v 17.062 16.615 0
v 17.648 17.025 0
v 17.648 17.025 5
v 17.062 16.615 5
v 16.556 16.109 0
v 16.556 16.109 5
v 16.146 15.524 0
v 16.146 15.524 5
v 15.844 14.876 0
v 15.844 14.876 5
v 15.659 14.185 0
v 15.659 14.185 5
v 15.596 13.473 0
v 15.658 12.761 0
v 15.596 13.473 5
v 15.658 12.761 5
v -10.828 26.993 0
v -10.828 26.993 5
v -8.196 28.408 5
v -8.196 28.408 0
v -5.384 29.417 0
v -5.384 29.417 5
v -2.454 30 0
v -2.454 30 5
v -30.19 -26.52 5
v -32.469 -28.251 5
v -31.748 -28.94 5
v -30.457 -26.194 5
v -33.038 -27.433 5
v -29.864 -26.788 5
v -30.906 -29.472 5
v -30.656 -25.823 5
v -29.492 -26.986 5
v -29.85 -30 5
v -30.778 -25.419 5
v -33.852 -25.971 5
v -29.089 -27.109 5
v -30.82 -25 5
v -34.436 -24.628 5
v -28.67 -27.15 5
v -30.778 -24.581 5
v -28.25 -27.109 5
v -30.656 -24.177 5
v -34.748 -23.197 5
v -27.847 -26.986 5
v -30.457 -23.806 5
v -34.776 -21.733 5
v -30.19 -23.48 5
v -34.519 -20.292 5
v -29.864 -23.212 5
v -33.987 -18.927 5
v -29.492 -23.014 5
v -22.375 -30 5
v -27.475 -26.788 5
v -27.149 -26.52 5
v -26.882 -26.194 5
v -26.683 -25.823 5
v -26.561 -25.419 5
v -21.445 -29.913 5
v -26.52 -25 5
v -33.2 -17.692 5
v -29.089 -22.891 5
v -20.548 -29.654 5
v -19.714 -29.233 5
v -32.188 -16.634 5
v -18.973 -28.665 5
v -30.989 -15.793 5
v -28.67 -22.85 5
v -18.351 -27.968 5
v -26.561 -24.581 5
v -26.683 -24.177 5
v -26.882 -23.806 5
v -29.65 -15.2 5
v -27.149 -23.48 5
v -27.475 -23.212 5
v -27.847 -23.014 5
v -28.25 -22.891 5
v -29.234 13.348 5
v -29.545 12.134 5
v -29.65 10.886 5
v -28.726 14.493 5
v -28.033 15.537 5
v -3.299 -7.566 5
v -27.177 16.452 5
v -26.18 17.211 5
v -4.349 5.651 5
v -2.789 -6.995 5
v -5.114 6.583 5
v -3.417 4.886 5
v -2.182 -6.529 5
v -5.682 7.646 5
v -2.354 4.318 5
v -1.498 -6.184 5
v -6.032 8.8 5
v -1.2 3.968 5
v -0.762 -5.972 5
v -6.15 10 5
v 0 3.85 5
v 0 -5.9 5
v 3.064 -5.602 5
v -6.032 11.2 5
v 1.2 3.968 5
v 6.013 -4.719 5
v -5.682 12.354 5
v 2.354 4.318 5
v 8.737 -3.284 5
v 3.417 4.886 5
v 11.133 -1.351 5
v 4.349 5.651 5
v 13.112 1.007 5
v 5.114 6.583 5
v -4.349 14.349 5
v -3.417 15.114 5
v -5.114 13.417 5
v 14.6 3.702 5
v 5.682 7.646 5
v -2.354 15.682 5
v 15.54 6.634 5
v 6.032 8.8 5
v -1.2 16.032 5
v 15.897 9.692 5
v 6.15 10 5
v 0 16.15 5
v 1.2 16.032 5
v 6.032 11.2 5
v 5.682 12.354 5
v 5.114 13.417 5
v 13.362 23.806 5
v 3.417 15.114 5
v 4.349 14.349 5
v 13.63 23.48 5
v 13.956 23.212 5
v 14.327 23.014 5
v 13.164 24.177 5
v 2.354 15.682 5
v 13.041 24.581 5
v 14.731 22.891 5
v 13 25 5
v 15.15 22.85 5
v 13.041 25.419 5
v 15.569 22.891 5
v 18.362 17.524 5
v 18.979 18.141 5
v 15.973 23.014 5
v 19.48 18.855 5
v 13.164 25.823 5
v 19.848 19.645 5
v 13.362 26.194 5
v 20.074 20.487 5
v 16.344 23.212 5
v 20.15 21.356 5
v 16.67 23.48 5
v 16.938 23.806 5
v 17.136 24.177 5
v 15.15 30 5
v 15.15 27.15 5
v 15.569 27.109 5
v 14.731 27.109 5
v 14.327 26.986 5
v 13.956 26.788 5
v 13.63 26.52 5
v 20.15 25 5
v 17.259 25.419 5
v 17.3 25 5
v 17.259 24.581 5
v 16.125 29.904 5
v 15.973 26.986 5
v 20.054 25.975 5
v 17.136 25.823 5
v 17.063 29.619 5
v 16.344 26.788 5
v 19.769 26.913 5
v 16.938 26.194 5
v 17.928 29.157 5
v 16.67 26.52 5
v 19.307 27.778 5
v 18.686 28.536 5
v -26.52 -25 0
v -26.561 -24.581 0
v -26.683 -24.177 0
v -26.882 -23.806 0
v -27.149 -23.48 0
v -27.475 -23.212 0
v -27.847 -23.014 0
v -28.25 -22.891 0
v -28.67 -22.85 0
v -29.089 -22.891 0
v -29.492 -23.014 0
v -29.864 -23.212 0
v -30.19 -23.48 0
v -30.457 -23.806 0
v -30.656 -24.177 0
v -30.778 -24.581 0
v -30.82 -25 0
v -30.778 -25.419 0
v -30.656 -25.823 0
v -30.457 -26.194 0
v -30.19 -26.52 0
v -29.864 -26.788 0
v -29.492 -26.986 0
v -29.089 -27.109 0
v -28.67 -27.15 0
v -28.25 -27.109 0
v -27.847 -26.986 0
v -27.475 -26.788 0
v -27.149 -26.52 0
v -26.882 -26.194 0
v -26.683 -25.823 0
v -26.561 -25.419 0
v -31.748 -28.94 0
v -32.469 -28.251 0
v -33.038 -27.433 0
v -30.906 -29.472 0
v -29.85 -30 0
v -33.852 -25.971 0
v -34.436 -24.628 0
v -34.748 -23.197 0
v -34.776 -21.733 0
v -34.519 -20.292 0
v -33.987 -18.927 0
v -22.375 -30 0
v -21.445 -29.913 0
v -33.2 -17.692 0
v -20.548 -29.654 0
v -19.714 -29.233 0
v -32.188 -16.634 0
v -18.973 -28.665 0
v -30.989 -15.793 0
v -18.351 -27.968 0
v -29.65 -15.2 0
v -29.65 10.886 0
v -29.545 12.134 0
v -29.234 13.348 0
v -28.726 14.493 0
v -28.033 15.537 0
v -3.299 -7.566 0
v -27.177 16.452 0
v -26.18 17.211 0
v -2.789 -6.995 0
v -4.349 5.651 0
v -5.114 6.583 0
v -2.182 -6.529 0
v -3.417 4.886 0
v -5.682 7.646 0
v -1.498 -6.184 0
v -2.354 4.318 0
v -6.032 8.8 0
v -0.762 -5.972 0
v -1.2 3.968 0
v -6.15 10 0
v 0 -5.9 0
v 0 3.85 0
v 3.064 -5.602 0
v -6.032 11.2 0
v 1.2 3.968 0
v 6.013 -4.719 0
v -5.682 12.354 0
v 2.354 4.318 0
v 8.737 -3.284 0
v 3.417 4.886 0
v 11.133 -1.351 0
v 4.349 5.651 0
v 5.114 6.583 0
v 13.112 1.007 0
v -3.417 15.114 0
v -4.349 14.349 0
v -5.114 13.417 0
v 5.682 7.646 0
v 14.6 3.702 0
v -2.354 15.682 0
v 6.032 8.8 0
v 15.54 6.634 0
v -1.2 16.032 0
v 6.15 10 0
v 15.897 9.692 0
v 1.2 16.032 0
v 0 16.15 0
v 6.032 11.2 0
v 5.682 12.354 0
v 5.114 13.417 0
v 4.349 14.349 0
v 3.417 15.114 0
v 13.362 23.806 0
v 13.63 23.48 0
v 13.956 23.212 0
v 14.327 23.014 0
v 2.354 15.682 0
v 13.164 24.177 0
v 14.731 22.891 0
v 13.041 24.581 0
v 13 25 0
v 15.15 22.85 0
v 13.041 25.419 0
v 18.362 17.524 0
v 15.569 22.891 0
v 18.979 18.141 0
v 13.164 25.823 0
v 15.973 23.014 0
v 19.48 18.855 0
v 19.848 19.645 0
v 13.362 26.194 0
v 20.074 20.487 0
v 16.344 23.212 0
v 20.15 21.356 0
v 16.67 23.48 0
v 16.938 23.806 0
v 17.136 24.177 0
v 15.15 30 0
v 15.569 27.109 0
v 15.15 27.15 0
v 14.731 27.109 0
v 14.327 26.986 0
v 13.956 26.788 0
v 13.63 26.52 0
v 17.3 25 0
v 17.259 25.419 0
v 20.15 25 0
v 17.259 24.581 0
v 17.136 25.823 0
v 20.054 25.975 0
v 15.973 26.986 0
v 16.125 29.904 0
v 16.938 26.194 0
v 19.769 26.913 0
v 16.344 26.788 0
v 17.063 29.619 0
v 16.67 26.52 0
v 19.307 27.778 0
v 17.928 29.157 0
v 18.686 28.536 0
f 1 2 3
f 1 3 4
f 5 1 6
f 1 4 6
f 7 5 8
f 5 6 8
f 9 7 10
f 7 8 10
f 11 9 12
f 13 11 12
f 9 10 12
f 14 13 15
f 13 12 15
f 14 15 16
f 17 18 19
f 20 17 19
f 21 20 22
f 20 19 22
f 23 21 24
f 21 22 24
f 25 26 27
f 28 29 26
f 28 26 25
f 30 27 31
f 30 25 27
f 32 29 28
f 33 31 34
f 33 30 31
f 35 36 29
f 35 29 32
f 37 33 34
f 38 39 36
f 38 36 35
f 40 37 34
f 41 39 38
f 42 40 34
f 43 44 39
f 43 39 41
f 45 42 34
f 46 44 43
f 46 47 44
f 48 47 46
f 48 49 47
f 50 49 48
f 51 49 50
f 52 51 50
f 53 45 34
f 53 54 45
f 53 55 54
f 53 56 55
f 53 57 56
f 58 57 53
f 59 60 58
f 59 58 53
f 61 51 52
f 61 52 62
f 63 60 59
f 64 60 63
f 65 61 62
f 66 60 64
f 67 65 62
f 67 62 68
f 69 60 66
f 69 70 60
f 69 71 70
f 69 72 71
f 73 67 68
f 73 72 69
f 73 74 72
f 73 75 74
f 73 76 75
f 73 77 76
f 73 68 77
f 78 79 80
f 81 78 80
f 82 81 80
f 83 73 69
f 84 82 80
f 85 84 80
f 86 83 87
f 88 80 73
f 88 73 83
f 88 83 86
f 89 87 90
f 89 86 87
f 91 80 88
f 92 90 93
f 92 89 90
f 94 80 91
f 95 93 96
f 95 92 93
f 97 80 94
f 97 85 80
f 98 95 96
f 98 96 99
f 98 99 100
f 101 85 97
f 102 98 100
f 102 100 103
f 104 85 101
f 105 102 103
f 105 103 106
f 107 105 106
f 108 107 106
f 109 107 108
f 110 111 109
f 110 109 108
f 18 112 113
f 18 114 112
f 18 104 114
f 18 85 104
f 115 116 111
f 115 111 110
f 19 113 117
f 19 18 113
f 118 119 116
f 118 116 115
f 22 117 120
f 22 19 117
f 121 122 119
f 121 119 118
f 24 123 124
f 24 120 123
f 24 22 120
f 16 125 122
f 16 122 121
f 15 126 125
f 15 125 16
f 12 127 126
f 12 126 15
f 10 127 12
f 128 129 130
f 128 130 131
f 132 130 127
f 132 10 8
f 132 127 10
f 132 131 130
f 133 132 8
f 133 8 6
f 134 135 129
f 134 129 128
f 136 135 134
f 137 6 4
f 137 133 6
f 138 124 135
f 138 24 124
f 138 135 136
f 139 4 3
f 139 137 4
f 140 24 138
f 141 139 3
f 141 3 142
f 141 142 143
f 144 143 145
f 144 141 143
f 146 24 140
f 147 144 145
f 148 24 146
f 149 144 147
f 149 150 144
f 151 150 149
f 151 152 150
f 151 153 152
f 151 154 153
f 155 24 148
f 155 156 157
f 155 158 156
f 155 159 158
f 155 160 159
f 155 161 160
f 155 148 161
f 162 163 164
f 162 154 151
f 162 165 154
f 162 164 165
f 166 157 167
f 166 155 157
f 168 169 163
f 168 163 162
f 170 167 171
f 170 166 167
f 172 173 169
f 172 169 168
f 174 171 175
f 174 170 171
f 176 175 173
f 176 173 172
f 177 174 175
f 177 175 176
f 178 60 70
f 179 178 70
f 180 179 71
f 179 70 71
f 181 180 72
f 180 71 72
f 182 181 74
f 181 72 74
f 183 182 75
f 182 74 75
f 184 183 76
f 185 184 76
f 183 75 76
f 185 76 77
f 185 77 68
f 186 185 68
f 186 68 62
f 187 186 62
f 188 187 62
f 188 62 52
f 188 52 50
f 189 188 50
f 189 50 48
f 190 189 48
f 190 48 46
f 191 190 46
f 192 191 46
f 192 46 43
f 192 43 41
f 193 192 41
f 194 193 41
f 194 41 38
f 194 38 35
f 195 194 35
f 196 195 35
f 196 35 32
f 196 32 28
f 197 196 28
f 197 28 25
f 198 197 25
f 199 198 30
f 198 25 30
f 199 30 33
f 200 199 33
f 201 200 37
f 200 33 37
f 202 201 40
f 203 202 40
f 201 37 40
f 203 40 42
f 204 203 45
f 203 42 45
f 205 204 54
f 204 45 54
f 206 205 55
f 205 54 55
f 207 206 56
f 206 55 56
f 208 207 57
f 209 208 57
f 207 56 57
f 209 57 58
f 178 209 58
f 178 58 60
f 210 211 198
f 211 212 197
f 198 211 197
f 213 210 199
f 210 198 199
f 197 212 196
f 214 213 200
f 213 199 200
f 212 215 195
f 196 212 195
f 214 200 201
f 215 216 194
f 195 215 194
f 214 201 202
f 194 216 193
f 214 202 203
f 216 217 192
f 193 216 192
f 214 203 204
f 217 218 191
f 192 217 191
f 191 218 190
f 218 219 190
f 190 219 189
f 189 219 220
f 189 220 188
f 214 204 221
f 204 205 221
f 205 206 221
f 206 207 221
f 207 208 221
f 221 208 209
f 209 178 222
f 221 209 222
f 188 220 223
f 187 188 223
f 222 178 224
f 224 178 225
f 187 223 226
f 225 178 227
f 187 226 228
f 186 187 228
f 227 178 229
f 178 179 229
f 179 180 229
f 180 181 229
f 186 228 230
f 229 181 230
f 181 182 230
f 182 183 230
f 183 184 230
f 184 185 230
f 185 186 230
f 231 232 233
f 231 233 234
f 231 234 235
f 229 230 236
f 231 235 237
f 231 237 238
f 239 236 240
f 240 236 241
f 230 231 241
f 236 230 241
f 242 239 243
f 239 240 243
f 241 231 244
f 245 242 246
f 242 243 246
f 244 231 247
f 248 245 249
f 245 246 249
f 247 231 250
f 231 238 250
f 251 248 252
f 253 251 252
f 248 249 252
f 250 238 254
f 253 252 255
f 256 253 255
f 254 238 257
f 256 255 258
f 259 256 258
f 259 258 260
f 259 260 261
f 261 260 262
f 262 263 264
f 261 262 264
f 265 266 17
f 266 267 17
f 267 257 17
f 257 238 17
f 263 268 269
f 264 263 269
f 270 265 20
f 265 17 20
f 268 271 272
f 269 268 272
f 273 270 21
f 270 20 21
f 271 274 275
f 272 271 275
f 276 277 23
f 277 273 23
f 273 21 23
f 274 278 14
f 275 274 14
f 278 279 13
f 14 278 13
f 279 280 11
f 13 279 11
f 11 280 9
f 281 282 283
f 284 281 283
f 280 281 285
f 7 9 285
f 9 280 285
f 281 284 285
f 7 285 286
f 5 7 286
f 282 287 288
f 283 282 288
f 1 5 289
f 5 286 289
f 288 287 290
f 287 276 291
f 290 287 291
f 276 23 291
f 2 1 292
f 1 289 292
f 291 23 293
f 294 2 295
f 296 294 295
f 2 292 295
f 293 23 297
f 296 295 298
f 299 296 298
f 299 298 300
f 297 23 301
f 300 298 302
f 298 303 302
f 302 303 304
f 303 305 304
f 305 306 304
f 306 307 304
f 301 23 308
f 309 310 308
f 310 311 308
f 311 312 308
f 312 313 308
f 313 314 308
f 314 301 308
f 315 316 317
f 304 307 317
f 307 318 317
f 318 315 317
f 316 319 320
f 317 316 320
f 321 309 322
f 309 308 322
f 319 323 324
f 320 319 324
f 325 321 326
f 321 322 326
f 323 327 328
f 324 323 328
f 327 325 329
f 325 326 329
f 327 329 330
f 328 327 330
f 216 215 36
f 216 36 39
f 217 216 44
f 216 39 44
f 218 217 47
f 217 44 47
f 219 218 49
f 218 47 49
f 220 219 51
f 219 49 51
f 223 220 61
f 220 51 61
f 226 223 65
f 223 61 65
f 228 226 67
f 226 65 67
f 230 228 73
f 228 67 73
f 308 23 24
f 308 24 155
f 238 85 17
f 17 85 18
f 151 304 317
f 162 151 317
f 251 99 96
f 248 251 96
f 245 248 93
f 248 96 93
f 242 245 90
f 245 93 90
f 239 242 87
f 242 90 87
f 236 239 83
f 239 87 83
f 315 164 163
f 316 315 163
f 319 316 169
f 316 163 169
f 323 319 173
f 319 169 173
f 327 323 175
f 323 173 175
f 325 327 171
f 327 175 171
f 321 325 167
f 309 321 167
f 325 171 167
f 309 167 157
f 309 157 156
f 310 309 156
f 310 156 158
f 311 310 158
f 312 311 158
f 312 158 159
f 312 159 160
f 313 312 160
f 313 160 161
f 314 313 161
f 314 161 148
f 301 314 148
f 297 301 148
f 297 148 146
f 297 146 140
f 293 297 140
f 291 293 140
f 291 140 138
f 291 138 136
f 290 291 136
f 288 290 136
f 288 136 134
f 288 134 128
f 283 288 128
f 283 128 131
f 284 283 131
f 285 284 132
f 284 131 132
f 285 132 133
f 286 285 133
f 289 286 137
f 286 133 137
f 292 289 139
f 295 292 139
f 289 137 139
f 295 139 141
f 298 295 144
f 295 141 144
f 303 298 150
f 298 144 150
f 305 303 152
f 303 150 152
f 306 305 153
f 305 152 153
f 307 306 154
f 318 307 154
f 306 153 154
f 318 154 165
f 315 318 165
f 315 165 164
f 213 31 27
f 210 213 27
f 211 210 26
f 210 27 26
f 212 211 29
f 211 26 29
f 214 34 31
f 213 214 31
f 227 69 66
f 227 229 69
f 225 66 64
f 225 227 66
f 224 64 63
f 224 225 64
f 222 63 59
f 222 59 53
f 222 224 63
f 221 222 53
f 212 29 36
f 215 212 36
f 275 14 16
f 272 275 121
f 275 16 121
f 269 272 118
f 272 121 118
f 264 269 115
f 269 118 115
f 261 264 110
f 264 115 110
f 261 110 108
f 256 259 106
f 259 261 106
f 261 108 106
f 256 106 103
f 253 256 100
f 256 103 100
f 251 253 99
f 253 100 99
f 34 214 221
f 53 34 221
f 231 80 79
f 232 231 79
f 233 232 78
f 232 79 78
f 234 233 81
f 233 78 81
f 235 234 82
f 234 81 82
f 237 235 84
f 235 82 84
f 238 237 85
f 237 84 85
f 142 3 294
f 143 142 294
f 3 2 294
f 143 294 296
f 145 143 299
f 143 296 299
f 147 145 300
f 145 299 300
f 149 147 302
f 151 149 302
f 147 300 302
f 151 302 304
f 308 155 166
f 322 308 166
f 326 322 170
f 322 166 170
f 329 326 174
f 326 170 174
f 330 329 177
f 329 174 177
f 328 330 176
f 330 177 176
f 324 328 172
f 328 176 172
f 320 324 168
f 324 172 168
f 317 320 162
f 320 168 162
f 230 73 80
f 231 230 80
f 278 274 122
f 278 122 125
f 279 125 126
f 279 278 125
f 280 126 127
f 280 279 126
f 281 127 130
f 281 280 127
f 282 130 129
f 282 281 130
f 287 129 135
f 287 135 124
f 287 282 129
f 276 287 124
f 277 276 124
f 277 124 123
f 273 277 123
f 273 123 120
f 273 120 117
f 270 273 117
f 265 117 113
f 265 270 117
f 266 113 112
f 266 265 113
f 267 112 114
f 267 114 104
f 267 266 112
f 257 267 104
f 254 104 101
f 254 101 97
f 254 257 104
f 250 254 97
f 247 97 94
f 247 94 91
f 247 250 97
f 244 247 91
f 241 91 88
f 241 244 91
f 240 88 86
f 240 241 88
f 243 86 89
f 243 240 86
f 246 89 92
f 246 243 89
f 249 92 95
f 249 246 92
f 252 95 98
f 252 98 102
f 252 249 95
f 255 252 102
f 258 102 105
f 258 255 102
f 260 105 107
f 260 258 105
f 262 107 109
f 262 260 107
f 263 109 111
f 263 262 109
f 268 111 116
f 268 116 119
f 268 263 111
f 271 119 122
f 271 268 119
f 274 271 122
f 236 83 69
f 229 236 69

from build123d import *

# Parameters (mm, degrees)
SKETCH_1_W          = 80
SKETCH_1_H          = 60
SKETCH_1_R          = 6.15
EXTRUDE_1_DEPTH     = 5
SKETCH_2_R          = 2.15
CUT_EXTRUDE_1_DEPTH = 68.134361545
SKETCH_3_R          = 2.15
CUT_EXTRUDE_2_DEPTH = 68.134361545
CUT_EXTRUDE_3_DEPTH = 68.134361545
SKETCH_6_R          = 2.15
CUT_EXTRUDE_5_DEPTH = 68.134361545
CUT_EXTRUDE_7_DEPTH = 68.134361545
FILLET_1_R          = 7.5
CUT_EXTRUDE_8_DEPTH = 47.216858546
FILLET_2_R          = 5
FILLET_3_R          = 5


with BuildPart() as part:
    # ｽｹｯﾁ1 → ﾎﾞｽ - 押し出し1 (new body)
    with BuildSketch(Plane.XY):
        with Locations((-19.85, 0)):
            Rectangle(SKETCH_1_W, SKETCH_1_H)
        with Locations((0, 10)):
            Circle(SKETCH_1_R, mode=Mode.SUBTRACT)
    extrude(amount=EXTRUDE_1_DEPTH)

    # ｽｹｯﾁ2 → ｶｯﾄ - 押し出し1 (cut, through all)
    with BuildSketch(Plane.XY.offset(5)):
        with Locations((-54.85, 10)):
            Circle(SKETCH_2_R)
        with Locations(Location((-54.85, -10, 0), (0, 0, 180))):
            Circle(SKETCH_2_R)
        with Locations((-34.85, 10)):
            Circle(SKETCH_2_R)
        with Locations(Location((-34.85, -10, 0), (0, 0, 180))):
            Circle(SKETCH_2_R)
    extrude(amount=-CUT_EXTRUDE_1_DEPTH, mode=Mode.SUBTRACT)

    # ｽｹｯﾁ3 → ｶｯﾄ - 押し出し2 (cut, through all)
    with BuildSketch(Plane.XY.offset(5)):
        with Locations((15.15, 25)):
            Circle(SKETCH_3_R)
        with BuildLine():
            ThreePointArc((15.15, 30), (18.685533906, 28.535533906), (20.15, 25))
            Line((20.15, 25), (20.15, 30))
            Line((20.15, 30), (15.15, 30))
        make_face()
    extrude(amount=-CUT_EXTRUDE_2_DEPTH, mode=Mode.SUBTRACT)

    # ｽｹｯﾁ4 → ｶｯﾄ - 押し出し3 (cut, through all)
    with BuildSketch(Plane.XY.offset(5)):
        Polygon((-59.85, 30), (-59.85, 15), (-29.85, 30), align=None)
        Polygon((-29.85, -30), (-59.85, -15), (-59.85, -30), align=None)
        with BuildLine():
            Line((20.15, 0), (17.493498792, 0))
            ThreePointArc((17.493498792, 0), (15.094907291, -3.347893986), (12.06572435, -6.138178209))
            Line((12.06572435, -6.138178209), (-19.85, -30))
            Line((-19.85, -30), (20.15, -30))
            Line((20.15, -30), (20.15, 0))
        make_face()
        with BuildLine():
            ThreePointArc((20.15, 10), (19.474553919, 4.8265824), (17.493498792, 0))
            Line((17.493498792, 0), (20.15, 0))
            Line((20.15, 0), (20.15, 10))
        make_face()
    extrude(amount=-CUT_EXTRUDE_3_DEPTH, mode=Mode.SUBTRACT)

    # ｽｹｯﾁ6 → ｶｯﾄ - 押し出し5 (cut, through all)
    with BuildSketch(Plane.XY.offset(5)):
        with Locations((-28.669660113, -25)):
            Circle(SKETCH_6_R)
    extrude(amount=-CUT_EXTRUDE_5_DEPTH, mode=Mode.SUBTRACT)

    # ｽｹｯﾁ7 → ｶｯﾄ - 押し出し7 (cut, through all)
    with BuildSketch(Plane.XY.offset(5)):
        with BuildLine():
            Line((-33.038002917, -27.432607888), (-39.85, -15.2))
            Line((-39.85, -15.2), (-29.65, -15.2))
            Line((-29.65, -15.2), (-29.65, 15))
            Line((-29.65, 15), (-10.828193198, 26.993314334))
            ThreePointArc((-10.828193198, 26.993314334), (-6.809164655, 28.964645441), (-2.454078238, 30))
            Line((-2.454078238, 30), (-29.85, 30))
            Line((-29.85, 30), (-59.85, 15))
            Line((-59.85, 15), (-59.85, -15))
            Line((-59.85, -15), (-30.90572732, -29.47213634))
            ThreePointArc((-30.90572732, -29.47213634), (-32.125738379, -28.613242729), (-33.038002917, -27.432607888))
        make_face()
    extrude(amount=-CUT_EXTRUDE_7_DEPTH, mode=Mode.SUBTRACT)

    # ﾌｨﾚｯﾄ1
    # the kernel refuses this fillet: 7.5 mm, written as the material it takes off along each edge
    with BuildSketch(Plane(origin=(-39.85, -15.2, 35.821289963), x_dir=(1, 0, 0), z_dir=(0, 0, -1))) as fillet_1_piece_1:
        with BuildLine():
            CenterArc((12.550603255, 7.122124988), FILLET_1_R, 150.887789783, 100.847129313)
            Line((5.998089047, 10.77103682), (5.867038763, 10.844015057))
            Line((5.867038763, 10.844015057), (-0.131050284, 0.072978237))
            Line((-0.131050284, 0.072978237), (0, -0.15))
            ThreePointArc((0, -0.15), (5.1, -0.15), (10.152987935, -0.1424425))
            Line((10.152987935, -0.1424425), (10.2, 0))
        make_face()
    extrude(amount=66.642579926, mode=Mode.SUBTRACT)
    with BuildSketch(Plane(origin=(-29.65, 15, 15.285449565), x_dir=(0.8433406617465673, 0.5373793150511676, 0), z_dir=(0, 0, -1))) as fillet_1_piece_2:
        with BuildLine():
            CenterArc((FILLET_1_R * 0.548557310151, FILLET_1_R), FILLET_1_R, 212.505415036, 57.494584964)
            Line((-FILLET_1_R * 0.294783351595, FILLET_1_R * 0.462620684949), (-FILLET_1_R * 0.31165016483, FILLET_1_R * 0.451873098648))
            Line((-FILLET_1_R * 0.31165016483, FILLET_1_R * 0.451873098648), (-FILLET_1_R * 0.010971146203, -FILLET_1_R * 0.02))
            Line((-FILLET_1_R * 0.010971146203, -FILLET_1_R * 0.02), (FILLET_1_R * 0.548557310151, -FILLET_1_R * 0.02))
            Line((FILLET_1_R * 0.548557310151, -FILLET_1_R * 0.02), (FILLET_1_R * 0.548557310151, 0))
        make_face()
    extrude(amount=25.570899131, mode=Mode.SUBTRACT)

    # ｽｹｯﾁ8 → ｶｯﾄ - 押し出し8 (cut, through all)
    with BuildSketch(Plane.XY.offset(5)):
        with BuildLine():
            Line((-3.299299523, -7.565945223), (-19.85, -30))
            Line((-19.85, -30), (1.477219454, -14.054684007))
            ThreePointArc((1.477219454, -14.054684007), (0.73895718, -14.088668338), (0, -14.1))
            ThreePointArc((0, -14.1), (-3.659892388, -11.848022648), (-3.299299523, -7.565945223))
        make_face()
        with BuildLine():
            ThreePointArc((0, -5.9), (-1.848022648, -6.340107612), (-3.299299523, -7.565945223))
            ThreePointArc((-3.299299523, -7.565945223), (-3.659892388, -11.848022648), (0, -14.1))
            ThreePointArc((0, -14.1), (0.73895718, -14.088668338), (1.477219454, -14.054684007))
            Line((1.477219454, -14.054684007), (12.06572435, -6.138178209))
            ThreePointArc((12.06572435, -6.138178209), (18.015921371, 0.975085753), (20.15, 10))
            Line((20.15, 10), (20.15, 17.547767201))
            ThreePointArc((20.15, 17.547767201), (16.706289505, 16.278441046), (15.658443273, 12.761006025))
            ThreePointArc((15.658443273, 12.761006025), (12.180106646, -0.220322994), (0, -5.9))
        make_face()
    extrude(amount=-CUT_EXTRUDE_8_DEPTH, mode=Mode.SUBTRACT)

    # ﾌｨﾚｯﾄ2
    fillet_2_edges = [part.edges().sort_by_distance(p)[0] for p in [
        (-19.85, -30, 2.5),
    ]]
    fillet(fillet_2_edges, radius=FILLET_2_R)

    # ﾌｨﾚｯﾄ3
    fillet_3_edges = [part.edges().sort_by_distance(p)[0] for p in [
        (20.15, 17.547767201, 2.5),
    ]]
    fillet(fillet_3_edges, radius=FILLET_3_R)


solid = part.part
